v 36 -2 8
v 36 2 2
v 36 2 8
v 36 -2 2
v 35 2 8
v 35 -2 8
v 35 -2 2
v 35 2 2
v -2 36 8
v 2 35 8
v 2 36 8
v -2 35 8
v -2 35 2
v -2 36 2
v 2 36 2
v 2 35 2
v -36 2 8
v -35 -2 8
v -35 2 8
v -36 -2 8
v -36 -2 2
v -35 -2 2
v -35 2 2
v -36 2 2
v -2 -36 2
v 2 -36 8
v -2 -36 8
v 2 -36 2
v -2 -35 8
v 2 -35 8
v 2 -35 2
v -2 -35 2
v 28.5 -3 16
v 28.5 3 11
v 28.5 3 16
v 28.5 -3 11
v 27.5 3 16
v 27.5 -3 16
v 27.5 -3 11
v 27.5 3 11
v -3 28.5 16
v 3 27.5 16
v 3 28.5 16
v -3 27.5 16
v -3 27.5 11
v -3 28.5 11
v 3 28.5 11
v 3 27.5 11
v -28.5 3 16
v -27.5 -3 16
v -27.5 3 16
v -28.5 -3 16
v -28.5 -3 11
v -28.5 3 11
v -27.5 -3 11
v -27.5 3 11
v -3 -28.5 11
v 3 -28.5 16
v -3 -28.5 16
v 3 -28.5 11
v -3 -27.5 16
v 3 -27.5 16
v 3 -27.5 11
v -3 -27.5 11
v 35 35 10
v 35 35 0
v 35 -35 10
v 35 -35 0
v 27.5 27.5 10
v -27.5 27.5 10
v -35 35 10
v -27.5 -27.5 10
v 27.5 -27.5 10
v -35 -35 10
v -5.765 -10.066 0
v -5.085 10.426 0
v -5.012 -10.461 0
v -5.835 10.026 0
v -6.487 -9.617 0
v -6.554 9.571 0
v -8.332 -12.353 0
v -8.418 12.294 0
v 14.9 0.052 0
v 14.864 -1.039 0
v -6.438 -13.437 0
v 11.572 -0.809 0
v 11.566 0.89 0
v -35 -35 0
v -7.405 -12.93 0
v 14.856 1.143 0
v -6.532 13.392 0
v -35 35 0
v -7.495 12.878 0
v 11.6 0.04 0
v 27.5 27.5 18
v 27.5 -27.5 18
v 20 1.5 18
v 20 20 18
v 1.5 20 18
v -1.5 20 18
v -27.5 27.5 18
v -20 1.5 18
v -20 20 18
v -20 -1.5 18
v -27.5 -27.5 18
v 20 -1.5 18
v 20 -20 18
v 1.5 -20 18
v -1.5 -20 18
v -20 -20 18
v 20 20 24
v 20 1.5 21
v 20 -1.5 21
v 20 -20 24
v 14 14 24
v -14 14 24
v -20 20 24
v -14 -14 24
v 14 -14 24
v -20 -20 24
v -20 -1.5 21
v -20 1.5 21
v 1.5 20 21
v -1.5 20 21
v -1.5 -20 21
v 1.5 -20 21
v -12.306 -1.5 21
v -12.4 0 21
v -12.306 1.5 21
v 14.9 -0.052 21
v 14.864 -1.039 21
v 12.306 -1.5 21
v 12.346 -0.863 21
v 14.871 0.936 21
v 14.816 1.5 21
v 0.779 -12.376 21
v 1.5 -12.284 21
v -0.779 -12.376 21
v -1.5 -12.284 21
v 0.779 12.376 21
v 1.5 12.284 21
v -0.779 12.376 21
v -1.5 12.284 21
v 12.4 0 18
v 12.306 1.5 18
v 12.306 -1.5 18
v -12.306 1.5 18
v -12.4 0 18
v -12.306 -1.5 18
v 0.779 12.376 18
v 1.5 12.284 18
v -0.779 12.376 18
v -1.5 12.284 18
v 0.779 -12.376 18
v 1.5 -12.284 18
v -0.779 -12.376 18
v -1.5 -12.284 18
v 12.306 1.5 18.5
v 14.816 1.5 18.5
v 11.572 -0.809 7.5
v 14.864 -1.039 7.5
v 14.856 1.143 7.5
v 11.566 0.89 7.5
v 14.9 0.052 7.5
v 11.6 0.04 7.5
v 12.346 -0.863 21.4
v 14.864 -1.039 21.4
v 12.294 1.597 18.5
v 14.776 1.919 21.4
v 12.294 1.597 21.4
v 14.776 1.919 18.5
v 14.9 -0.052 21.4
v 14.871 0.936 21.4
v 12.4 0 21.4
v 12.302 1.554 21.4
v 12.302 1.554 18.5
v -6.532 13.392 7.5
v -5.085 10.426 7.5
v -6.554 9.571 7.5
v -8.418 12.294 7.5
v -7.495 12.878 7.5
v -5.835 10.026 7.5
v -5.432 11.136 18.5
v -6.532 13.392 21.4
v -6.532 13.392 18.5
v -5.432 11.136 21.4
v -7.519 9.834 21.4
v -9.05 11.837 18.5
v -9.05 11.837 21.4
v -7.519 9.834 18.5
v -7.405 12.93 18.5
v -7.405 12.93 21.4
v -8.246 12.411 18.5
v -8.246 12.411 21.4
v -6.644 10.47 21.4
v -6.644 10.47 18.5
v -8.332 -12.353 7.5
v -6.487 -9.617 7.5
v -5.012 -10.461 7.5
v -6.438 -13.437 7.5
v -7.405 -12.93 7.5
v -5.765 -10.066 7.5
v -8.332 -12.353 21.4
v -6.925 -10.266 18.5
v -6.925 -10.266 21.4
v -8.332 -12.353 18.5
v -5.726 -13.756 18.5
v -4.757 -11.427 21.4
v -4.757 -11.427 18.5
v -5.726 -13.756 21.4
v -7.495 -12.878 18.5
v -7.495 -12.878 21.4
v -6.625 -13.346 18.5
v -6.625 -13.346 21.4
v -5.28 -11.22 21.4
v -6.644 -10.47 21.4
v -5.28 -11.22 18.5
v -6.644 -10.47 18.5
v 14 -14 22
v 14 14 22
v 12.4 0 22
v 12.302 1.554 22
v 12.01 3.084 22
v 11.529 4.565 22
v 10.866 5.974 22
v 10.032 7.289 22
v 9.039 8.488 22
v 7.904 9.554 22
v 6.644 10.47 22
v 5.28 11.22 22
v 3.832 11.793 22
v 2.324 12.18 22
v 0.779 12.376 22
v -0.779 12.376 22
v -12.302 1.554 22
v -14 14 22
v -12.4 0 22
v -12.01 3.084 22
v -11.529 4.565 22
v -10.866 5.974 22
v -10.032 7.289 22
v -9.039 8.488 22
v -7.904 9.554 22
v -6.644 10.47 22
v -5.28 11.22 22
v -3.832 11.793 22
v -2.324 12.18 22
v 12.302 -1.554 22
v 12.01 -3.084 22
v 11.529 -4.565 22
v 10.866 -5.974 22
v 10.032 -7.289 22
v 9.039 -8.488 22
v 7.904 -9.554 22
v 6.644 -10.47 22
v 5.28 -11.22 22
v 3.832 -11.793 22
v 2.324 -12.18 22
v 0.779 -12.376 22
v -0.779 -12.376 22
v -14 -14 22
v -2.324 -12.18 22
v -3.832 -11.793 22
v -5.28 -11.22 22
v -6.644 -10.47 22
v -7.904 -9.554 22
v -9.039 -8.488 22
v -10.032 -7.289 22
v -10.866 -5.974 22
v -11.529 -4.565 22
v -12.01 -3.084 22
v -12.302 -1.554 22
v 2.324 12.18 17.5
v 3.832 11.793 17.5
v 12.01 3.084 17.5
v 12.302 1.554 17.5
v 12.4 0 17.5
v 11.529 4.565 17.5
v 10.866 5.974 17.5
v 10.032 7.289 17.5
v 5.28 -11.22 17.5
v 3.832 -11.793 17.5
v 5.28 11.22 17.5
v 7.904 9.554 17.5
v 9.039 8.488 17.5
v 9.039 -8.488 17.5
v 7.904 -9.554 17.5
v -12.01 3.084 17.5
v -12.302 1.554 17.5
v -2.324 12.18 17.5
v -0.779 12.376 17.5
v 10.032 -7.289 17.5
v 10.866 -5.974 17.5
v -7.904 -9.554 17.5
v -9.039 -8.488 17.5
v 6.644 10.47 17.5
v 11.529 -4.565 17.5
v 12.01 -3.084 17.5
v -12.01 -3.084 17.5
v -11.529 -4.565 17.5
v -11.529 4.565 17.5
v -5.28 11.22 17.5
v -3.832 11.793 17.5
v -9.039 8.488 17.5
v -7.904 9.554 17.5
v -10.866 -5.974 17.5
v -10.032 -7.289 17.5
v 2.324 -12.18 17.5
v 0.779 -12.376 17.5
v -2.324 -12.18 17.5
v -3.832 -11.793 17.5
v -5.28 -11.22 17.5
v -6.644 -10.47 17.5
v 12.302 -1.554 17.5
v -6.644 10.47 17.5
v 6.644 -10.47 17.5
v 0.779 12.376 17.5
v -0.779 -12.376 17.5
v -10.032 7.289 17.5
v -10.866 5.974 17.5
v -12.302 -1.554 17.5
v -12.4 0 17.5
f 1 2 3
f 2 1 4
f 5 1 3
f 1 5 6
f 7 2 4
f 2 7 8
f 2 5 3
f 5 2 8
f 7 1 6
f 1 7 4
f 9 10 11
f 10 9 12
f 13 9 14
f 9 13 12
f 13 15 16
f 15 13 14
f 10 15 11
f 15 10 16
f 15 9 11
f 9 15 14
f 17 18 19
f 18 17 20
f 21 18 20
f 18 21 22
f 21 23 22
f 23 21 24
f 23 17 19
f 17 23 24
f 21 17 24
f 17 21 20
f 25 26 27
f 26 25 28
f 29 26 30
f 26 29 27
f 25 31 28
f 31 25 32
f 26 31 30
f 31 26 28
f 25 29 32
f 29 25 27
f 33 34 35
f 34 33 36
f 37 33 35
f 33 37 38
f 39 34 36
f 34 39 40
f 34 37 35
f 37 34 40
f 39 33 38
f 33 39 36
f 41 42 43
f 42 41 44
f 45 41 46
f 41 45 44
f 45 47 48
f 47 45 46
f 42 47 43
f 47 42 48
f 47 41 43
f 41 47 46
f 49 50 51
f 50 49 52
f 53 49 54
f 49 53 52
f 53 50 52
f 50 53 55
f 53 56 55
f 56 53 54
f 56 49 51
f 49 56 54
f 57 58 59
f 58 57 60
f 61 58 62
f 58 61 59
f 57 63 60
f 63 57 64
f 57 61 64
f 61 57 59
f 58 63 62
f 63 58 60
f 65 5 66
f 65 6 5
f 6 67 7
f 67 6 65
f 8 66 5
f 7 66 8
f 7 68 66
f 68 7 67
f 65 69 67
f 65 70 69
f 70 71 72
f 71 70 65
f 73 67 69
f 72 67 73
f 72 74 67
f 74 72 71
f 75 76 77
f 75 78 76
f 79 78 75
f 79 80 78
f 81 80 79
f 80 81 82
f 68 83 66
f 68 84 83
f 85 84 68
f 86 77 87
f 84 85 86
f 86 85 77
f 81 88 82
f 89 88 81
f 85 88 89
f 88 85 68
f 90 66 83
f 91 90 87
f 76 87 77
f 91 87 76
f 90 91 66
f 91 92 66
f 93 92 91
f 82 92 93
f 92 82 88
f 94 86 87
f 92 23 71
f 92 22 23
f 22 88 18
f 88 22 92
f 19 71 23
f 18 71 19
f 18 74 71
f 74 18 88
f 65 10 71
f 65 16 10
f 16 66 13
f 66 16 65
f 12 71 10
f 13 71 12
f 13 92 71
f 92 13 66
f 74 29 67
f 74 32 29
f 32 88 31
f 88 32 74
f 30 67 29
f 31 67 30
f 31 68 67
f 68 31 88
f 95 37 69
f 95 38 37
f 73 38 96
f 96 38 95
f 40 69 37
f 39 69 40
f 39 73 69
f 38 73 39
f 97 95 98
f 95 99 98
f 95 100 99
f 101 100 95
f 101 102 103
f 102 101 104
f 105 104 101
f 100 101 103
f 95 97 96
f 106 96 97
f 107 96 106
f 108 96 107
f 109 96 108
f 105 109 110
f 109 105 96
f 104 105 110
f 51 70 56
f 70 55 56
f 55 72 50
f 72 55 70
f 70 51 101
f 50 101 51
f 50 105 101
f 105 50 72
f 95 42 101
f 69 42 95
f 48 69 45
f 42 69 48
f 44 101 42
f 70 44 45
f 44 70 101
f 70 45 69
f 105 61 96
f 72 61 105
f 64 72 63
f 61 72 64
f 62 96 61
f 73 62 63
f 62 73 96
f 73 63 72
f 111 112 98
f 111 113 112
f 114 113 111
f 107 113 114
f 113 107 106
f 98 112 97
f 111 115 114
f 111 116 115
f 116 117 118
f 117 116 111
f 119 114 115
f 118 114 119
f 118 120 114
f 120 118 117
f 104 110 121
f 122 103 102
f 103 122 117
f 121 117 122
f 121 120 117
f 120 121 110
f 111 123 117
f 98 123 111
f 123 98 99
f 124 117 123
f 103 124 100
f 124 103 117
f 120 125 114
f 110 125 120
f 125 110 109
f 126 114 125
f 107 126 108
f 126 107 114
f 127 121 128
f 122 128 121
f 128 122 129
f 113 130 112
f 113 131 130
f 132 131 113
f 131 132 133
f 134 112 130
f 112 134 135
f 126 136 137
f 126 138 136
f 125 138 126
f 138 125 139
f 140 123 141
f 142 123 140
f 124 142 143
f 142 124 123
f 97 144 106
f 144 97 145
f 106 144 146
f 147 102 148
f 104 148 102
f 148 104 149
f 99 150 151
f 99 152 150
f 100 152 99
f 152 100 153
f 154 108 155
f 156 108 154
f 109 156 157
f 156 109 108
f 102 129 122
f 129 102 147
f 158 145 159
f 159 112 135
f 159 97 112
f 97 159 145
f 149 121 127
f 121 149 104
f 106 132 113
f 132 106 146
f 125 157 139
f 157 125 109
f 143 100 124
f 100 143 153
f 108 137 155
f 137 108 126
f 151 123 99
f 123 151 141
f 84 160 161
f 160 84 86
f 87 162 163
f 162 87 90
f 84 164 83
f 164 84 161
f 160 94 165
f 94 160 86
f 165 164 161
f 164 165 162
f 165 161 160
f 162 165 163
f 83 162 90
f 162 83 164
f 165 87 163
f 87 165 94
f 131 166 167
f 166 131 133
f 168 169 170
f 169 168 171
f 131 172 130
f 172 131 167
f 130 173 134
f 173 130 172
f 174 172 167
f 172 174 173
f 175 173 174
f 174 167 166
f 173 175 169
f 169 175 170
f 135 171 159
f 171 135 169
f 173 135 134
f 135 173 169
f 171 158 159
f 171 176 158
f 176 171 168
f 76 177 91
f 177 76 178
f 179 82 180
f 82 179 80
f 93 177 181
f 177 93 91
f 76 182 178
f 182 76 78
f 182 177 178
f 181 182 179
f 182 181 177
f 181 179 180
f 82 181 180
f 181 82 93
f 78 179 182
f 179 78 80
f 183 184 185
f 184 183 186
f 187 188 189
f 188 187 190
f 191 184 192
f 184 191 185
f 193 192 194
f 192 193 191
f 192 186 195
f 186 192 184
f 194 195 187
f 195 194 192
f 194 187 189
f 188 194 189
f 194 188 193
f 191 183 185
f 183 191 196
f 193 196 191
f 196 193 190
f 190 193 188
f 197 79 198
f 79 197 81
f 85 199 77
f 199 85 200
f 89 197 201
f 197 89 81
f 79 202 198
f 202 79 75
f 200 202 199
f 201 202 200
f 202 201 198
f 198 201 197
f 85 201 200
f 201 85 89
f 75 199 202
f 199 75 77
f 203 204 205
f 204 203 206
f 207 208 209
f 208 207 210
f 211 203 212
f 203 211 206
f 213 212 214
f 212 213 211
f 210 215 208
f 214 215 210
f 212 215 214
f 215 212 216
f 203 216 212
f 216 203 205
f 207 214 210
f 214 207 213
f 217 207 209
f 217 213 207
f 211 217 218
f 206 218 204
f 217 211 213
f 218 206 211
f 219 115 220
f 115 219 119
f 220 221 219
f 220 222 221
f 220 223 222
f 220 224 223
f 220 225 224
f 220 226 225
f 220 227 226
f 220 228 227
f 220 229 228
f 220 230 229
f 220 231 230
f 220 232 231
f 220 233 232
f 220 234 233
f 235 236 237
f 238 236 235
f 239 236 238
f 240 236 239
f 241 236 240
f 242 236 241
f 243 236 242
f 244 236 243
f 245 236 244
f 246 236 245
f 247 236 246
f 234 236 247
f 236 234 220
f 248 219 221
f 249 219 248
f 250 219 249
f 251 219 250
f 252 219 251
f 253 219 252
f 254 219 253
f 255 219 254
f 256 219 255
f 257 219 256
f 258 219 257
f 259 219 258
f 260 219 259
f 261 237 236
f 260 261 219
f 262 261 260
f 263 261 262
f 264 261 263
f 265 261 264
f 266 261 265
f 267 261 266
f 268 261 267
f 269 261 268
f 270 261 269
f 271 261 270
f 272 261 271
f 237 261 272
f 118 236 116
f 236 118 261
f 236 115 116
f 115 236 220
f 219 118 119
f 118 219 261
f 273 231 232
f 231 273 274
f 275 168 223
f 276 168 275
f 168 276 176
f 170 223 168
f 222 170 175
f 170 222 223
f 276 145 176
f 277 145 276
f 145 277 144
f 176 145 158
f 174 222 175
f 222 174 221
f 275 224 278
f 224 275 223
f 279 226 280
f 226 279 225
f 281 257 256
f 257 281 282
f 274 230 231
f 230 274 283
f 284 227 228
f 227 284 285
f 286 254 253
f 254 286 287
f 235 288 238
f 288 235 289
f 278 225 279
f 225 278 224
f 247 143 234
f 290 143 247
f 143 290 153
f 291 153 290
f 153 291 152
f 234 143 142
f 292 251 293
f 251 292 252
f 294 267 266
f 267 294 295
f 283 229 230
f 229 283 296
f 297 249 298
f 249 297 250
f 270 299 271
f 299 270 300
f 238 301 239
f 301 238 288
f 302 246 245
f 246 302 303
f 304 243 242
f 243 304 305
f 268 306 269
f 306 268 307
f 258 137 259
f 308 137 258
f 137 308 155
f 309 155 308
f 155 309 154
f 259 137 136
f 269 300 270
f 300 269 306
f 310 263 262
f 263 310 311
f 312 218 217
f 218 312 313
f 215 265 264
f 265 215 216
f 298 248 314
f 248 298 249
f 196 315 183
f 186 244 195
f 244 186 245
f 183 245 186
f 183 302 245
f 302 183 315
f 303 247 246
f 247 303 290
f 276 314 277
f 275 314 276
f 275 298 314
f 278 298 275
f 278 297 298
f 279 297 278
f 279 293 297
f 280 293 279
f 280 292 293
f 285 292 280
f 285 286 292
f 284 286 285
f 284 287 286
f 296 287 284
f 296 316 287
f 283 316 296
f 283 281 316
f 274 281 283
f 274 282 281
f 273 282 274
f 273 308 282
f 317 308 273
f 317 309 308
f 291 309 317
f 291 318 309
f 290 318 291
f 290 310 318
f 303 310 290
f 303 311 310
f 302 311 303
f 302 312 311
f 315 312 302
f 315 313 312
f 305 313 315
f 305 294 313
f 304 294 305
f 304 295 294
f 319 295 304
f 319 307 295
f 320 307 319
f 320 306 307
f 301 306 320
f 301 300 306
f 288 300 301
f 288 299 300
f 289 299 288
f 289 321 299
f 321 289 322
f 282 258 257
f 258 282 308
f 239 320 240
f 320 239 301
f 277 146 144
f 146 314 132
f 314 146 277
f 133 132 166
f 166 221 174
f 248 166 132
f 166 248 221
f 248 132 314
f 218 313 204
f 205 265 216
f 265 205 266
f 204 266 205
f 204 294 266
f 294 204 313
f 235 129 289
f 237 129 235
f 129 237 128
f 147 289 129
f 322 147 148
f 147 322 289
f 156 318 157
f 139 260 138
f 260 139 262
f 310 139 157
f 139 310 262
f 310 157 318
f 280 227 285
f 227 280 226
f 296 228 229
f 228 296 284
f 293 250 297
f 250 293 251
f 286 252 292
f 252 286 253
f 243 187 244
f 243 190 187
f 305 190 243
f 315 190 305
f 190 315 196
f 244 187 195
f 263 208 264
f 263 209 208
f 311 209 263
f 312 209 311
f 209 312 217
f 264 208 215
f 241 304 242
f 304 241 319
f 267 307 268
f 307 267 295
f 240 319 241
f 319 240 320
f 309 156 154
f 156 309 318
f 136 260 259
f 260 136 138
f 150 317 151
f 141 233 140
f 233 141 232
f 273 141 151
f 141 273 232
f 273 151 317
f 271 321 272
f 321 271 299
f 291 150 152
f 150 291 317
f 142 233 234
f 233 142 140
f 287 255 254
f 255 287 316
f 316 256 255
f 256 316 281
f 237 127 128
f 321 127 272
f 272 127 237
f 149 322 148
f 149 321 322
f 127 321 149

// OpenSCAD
// AETHERYTE – PART 1: BASE

$fn = 50;

base1_size = [70, 70, 10];
base2_size = [55, 55, 8];
base3_size = [40, 40, 6];

collar_radius = 9;
tolerance     = 0.4;

bay_tab_count = 3;
bay_tab_w = 8;
bay_tab_h = 2.5;
bay_tab_r = collar_radius + 3;
bay_entry_h = 3;
bay_lock_depth = 3;

base_top = base1_size[2] + base2_size[2] + base3_size[2];

base();

module base()
{
    difference()
    {
        union()
        {
            // tier 1
            translate([-base1_size[0]/2, -base1_size[1]/2, 0])
                cube(base1_size);

            // decorative notches tier 1
            for (i = [0 : 7])
                rotate([0, 0, i * 45])
                    translate([base1_size[0]/2 - 3, -2, 2])
                        cube([4, 4, 6]);

            // tier 2
            translate([-base2_size[0]/2, -base2_size[1]/2, base1_size[2]])
                cube(base2_size);

            // decorative notches tier 2
            for (i = [0 : 3])
                rotate([0, 0, i * 90])
                    translate([base2_size[0]/2 - 2, -3, base1_size[2] + 1])
                        cube([3, 6, 5]);

            // tier 3
            translate([-base3_size[0]/2, -base3_size[1]/2,
                       base1_size[2] + base2_size[2]])
                cube(base3_size);
        }

        // recess on tier 3 top
        translate([-(base3_size[0] - 12)/2,
                   -(base3_size[1] - 12)/2,
                    base_top - 2])
            cube([base3_size[0] - 12, base3_size[1] - 12, 3]);

        // cross channel on tier 3
        for (rot = [0, 90])
            rotate([0, 0, rot])
                translate([-base3_size[0]/2, -1.5,
                            base1_size[2] + base2_size[2]])
                    cube([base3_size[0], 3, 3]);

        // central bore for collar stem
        translate([0, 0, base_top - bay_entry_h - bay_tab_h - 1])
            cylinder(h = bay_entry_h + bay_tab_h + 2,
                     r = bay_tab_r + tolerance, $fn = 50);

        // bayonet L-channels
        for (i = [0 : bay_tab_count - 1])
        {
            rotate([0, 0, i * (360 / bay_tab_count)])
            {
                // vertical entry slot
                rotate([0, 0, -bay_tab_w / 2])
                rotate_extrude(angle = bay_tab_w + tolerance, $fn = 100)
                    translate([bay_tab_r - tolerance, 0])
                        square([bay_tab_h + tolerance * 2,
                                bay_entry_h + bay_tab_h + 2]);

                // horizontal lock pocket
                rotate([0, 0, -bay_tab_w / 2])
                rotate_extrude(angle = bay_lock_depth + bay_tab_w + tolerance,
                               $fn = 100)
                    translate([bay_tab_r - tolerance,
                               base_top - bay_tab_h - bay_entry_h])
                        square([bay_tab_h + tolerance * 2,
                                bay_tab_h + tolerance]);
            }
        }
    }
}
